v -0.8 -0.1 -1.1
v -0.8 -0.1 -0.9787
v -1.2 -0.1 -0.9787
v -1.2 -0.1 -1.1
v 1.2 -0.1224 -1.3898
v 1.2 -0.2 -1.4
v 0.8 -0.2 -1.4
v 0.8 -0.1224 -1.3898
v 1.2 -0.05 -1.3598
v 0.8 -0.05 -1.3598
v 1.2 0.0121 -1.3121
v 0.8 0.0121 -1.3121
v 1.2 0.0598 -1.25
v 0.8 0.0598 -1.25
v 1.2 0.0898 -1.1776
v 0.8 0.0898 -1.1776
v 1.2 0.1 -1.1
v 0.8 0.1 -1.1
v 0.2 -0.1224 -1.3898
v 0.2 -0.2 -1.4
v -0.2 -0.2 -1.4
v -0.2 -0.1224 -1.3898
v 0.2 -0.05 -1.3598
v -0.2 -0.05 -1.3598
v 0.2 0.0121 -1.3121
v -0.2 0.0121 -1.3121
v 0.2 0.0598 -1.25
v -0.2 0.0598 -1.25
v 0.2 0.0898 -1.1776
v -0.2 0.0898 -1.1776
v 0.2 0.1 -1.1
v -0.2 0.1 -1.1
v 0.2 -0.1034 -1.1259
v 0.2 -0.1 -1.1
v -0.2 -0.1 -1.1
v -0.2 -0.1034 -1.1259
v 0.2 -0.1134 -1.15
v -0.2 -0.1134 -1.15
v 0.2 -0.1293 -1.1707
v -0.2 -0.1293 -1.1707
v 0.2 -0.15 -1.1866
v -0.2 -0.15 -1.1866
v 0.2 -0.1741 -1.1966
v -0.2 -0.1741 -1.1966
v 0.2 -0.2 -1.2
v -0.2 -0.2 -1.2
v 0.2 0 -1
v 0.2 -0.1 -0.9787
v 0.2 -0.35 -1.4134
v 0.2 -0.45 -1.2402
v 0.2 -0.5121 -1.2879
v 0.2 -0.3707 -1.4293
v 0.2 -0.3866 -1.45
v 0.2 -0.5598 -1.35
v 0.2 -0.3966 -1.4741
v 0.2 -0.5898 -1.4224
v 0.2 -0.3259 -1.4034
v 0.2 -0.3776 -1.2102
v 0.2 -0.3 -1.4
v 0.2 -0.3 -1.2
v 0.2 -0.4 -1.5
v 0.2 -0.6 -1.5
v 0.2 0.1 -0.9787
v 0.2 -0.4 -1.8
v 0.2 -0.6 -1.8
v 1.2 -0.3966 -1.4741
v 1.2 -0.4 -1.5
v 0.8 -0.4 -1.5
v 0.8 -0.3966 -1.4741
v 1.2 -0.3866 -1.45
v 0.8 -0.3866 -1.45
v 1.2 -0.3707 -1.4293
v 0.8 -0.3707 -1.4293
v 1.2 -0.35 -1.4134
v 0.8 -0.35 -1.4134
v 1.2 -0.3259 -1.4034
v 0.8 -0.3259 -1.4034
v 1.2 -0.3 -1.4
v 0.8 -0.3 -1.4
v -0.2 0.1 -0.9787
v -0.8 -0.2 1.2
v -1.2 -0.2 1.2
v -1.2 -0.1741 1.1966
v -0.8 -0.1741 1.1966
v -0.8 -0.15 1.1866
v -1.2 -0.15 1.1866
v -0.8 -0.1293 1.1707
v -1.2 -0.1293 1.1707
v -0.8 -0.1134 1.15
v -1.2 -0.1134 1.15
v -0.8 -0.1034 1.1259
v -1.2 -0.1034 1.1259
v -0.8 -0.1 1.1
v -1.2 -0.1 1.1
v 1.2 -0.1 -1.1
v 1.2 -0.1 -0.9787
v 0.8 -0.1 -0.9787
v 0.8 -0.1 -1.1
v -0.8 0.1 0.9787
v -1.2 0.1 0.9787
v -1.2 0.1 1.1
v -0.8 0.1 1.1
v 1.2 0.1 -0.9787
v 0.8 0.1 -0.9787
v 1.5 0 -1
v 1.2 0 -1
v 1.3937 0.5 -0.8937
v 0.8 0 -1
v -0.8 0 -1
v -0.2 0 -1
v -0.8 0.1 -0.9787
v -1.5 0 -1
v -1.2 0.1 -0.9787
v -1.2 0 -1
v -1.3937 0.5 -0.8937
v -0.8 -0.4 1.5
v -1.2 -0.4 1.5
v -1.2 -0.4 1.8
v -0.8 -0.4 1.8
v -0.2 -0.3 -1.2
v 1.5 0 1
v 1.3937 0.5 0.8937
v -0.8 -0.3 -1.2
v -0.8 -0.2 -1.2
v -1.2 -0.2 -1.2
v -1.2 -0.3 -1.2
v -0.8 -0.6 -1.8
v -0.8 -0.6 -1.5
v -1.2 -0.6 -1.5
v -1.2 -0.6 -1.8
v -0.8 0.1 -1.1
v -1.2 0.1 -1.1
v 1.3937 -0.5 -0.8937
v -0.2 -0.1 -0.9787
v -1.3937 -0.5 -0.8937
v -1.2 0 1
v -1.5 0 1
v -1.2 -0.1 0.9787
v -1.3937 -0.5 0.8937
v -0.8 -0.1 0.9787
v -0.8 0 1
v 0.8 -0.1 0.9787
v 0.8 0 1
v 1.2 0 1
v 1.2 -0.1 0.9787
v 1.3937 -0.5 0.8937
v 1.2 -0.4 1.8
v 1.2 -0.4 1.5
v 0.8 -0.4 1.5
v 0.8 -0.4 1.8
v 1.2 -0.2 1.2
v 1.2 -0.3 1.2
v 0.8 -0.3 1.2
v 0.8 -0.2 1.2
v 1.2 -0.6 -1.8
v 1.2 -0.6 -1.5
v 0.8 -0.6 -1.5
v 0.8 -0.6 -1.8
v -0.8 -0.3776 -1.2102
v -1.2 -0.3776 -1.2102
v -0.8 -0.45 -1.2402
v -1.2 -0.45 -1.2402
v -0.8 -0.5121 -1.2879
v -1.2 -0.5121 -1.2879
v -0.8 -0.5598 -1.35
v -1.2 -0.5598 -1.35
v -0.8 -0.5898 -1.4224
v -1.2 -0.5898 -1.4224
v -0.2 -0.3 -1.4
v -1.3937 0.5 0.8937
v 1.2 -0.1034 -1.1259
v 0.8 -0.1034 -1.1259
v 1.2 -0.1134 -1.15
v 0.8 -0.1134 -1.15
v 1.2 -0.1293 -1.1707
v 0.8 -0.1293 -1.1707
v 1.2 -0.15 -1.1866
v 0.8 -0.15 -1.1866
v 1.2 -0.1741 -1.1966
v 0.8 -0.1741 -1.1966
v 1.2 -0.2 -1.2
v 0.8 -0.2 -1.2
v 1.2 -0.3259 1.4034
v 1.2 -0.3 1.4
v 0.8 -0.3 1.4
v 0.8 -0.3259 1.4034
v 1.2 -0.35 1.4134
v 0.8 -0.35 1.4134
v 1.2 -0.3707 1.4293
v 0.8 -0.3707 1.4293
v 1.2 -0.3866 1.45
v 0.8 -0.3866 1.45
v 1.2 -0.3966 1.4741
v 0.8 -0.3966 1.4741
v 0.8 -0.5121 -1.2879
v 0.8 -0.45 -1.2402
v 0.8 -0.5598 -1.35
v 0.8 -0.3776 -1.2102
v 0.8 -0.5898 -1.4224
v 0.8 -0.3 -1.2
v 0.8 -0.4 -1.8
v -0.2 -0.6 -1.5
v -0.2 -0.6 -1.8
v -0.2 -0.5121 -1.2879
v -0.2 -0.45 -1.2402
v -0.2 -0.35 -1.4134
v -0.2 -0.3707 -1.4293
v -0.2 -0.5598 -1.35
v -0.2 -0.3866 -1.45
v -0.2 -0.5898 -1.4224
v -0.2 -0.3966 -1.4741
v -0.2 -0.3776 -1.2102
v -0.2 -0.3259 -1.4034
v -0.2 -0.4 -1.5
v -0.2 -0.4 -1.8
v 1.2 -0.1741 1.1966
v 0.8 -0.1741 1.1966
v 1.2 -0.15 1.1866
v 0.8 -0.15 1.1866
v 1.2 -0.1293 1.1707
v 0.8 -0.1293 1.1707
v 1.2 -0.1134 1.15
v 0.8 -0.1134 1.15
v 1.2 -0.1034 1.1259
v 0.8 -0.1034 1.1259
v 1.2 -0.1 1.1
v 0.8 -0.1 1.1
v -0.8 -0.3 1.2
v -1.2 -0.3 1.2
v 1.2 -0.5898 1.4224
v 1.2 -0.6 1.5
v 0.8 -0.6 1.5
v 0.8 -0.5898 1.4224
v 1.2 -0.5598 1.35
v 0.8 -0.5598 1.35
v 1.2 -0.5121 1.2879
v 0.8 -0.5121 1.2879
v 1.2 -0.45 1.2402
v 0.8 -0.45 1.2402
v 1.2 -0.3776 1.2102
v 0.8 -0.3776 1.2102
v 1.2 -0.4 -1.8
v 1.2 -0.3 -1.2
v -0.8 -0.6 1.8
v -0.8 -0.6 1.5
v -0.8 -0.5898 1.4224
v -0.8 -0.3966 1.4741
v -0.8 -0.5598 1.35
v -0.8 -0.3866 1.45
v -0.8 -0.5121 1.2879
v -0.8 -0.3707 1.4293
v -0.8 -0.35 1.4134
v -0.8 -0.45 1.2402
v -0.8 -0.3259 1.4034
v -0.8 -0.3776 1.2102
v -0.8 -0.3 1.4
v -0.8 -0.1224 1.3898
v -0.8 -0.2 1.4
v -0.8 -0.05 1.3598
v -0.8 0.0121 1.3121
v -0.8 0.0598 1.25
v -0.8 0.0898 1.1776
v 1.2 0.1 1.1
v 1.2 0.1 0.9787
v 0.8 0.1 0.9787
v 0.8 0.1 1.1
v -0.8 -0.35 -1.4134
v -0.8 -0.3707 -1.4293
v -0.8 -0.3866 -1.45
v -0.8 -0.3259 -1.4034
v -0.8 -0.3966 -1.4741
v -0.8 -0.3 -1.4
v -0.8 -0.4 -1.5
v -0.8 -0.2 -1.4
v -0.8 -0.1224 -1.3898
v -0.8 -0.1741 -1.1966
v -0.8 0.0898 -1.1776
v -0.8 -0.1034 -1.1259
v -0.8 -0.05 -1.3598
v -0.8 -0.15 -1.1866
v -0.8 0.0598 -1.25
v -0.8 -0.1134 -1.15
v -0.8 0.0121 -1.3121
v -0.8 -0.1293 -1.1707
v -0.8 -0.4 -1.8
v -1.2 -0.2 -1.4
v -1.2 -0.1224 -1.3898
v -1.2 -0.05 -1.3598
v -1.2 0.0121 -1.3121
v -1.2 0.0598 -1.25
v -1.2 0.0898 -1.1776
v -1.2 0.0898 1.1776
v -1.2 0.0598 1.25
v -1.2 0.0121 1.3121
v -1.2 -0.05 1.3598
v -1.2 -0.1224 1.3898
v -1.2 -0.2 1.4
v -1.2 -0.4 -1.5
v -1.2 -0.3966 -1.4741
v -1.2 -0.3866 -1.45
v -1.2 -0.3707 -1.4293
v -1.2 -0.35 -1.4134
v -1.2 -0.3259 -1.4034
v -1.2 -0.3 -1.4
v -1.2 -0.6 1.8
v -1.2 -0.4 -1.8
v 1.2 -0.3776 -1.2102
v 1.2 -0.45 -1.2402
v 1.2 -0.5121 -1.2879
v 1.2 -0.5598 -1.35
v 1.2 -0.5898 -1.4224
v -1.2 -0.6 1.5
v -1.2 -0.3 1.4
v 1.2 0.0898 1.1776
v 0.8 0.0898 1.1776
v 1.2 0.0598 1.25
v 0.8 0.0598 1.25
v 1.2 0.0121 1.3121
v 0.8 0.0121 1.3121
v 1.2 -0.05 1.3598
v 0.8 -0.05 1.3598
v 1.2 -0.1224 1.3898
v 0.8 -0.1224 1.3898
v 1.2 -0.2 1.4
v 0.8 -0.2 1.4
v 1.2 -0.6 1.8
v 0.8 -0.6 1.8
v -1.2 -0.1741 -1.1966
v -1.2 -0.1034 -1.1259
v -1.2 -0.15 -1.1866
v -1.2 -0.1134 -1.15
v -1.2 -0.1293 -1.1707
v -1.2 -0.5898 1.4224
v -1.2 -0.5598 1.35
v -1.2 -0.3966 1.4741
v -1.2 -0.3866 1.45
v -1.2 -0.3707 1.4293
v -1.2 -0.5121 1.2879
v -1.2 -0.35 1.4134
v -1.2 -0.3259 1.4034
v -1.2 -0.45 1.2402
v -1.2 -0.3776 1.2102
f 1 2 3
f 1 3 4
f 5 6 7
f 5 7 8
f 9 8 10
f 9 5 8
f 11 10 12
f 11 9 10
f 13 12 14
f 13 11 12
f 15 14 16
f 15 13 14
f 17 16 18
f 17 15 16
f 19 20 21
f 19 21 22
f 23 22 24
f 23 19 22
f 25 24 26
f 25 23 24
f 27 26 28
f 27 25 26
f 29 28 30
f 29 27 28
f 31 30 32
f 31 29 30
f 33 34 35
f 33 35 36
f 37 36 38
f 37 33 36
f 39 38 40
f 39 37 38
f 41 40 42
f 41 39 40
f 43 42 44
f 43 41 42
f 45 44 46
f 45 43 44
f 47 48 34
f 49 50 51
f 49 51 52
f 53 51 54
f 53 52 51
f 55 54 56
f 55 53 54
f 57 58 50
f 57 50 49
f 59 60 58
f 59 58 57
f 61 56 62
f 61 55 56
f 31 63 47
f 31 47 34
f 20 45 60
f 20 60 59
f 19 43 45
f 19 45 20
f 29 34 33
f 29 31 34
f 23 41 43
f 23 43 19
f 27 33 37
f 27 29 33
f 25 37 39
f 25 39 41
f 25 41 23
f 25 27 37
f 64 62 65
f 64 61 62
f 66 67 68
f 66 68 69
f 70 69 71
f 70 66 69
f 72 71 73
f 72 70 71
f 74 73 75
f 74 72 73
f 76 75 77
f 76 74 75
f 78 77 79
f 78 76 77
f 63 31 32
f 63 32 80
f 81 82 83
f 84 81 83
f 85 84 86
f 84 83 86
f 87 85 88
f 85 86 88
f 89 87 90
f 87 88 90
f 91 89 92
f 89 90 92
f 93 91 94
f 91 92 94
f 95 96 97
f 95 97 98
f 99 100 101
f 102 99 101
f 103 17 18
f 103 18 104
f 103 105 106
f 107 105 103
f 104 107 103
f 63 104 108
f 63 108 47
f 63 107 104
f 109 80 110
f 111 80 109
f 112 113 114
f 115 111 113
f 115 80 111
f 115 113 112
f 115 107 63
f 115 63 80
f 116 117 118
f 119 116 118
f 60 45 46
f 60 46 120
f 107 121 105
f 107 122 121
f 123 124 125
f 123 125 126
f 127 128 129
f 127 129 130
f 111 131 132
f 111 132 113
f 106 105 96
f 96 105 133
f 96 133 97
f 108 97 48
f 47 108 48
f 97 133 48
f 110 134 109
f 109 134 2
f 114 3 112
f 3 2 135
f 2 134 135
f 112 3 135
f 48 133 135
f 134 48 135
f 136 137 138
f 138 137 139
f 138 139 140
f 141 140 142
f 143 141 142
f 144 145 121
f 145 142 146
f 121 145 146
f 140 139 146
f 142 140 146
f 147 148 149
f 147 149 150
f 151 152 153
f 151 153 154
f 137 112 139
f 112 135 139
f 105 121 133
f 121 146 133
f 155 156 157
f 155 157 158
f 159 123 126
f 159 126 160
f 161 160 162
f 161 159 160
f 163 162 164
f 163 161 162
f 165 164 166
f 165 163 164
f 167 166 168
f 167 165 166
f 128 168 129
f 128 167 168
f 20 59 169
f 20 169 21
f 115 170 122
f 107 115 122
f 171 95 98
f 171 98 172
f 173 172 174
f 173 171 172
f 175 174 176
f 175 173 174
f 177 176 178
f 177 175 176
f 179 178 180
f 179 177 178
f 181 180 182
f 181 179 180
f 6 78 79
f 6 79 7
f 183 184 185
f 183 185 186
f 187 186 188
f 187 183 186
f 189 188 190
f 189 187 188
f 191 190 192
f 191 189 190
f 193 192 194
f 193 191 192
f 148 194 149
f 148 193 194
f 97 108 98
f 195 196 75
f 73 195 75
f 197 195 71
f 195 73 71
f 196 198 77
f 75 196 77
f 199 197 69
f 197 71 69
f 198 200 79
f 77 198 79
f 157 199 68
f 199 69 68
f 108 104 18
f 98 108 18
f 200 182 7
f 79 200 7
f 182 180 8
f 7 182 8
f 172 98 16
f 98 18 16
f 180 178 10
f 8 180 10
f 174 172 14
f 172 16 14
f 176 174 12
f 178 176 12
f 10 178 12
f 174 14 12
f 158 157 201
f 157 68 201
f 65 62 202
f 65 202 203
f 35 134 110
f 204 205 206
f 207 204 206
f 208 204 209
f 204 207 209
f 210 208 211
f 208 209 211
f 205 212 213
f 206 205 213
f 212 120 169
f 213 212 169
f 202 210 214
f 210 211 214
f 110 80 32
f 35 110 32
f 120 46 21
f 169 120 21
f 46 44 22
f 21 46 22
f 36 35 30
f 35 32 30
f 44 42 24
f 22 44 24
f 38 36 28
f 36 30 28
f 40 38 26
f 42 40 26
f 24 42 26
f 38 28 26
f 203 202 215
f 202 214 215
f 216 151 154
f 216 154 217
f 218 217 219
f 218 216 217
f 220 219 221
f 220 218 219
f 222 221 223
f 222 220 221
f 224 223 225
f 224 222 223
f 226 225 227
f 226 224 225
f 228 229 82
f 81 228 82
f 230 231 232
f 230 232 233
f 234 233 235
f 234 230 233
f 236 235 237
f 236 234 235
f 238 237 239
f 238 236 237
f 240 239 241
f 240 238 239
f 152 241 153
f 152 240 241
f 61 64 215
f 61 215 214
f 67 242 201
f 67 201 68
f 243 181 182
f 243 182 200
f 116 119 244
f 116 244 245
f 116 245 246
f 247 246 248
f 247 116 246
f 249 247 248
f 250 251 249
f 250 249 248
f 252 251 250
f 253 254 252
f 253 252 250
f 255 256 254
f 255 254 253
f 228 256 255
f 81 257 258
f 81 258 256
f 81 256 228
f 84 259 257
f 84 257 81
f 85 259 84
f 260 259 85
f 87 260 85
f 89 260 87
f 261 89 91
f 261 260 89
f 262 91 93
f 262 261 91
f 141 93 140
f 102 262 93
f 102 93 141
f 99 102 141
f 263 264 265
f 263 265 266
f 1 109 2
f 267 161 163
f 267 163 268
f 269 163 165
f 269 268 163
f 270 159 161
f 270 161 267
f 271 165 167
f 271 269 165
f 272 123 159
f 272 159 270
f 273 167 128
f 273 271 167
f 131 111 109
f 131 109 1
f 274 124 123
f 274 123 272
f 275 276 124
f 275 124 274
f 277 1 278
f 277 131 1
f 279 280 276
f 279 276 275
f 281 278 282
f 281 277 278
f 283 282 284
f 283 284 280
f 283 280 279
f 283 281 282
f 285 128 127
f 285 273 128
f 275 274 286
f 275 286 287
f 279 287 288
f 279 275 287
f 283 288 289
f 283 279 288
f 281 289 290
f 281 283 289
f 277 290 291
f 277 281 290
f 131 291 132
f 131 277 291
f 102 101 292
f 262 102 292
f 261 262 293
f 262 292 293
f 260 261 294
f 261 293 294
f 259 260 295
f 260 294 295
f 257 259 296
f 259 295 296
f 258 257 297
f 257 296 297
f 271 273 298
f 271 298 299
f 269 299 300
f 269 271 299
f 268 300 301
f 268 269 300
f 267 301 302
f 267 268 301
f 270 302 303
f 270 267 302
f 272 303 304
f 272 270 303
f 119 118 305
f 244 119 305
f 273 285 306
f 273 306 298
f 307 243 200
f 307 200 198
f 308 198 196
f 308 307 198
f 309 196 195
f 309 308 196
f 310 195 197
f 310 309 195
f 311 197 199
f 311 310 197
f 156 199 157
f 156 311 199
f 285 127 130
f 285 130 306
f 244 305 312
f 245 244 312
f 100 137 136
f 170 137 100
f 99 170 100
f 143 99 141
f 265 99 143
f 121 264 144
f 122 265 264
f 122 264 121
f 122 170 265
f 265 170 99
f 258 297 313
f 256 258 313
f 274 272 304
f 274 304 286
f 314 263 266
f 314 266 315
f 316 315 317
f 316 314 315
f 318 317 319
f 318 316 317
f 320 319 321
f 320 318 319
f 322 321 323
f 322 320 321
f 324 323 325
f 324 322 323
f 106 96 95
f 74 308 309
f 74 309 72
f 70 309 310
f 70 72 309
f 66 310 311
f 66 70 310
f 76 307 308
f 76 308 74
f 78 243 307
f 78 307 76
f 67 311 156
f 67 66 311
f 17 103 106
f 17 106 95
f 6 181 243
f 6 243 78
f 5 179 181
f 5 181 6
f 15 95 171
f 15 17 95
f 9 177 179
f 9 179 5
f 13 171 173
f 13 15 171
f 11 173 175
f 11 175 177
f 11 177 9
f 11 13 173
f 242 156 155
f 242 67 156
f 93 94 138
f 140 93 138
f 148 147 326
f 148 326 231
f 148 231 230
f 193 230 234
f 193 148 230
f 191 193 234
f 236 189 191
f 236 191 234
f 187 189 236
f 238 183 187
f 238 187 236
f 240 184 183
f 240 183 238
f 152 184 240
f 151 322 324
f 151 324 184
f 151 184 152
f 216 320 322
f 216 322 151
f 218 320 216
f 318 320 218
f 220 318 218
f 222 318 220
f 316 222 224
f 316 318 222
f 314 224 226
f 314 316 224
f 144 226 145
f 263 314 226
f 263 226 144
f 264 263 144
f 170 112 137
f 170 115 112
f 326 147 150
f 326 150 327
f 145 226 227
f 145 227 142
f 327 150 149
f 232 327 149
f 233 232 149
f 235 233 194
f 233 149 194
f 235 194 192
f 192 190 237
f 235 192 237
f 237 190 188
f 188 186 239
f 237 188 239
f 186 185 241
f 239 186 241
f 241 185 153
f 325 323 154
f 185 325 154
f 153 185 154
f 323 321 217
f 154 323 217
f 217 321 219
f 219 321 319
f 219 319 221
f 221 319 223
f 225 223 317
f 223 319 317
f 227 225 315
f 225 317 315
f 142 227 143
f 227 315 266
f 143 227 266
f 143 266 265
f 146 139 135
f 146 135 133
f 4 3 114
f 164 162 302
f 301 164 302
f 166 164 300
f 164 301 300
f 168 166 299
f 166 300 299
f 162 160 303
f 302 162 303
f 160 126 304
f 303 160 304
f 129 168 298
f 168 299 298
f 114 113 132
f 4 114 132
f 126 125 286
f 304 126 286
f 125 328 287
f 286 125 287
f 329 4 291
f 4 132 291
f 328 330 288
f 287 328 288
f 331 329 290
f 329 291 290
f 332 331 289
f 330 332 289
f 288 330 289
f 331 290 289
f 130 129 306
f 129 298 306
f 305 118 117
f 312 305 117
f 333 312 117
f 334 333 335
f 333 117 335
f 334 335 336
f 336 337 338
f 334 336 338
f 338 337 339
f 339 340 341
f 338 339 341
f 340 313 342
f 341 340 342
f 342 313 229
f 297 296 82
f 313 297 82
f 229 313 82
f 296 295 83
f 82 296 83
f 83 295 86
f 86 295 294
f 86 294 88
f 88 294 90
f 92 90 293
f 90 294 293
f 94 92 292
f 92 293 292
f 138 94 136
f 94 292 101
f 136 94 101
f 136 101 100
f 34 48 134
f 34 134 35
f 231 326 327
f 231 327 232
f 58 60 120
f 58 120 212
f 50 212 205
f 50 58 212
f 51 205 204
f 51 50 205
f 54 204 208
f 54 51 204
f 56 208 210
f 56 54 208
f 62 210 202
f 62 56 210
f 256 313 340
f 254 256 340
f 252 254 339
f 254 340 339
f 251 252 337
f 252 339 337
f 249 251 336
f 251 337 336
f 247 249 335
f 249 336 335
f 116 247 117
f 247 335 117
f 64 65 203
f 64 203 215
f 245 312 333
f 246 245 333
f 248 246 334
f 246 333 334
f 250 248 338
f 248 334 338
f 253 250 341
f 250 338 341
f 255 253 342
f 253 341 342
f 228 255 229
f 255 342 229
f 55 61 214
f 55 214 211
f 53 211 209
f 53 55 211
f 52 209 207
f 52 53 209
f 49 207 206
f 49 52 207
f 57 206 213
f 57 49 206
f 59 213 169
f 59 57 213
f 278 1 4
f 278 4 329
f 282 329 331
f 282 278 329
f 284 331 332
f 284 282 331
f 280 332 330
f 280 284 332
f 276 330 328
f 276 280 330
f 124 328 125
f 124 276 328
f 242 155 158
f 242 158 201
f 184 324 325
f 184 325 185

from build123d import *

# Parameters (mm, degrees)
BASES_W               = 3
BASES_H               = 2
BASE_DEPTH            = 0.5
BASE_TAPER            = 12
BASE_OTHER_WAY_DEPTH  = 0.5
BASE_OTHER_WAY_TAPER  = 12
VINSOLDERJOINT_DEPTH  = 0.2
SJLP_COUNT            = 2
SJLP_PITCH            = 1
SJLP_COL_COUNT        = 2
SJLP_COL_PITCH        = 1
VOUTSOLDERJOINT_DEPTH = 0.2


with BuildPart() as part:
    # BaseS → Base (new body)
    with BuildSketch(Plane(origin=(0, 0, 0), x_dir=(1, 0, 0), z_dir=(0, 1, 0))):
        Rectangle(BASES_W, BASES_H)
    extrude(amount=BASE_DEPTH, taper=BASE_TAPER)

    # BaseS → Base other way (add)
    with BuildSketch(Plane(origin=(0, 0, 0), x_dir=(1, 0, 0), z_dir=(0, 1, 0))):
        Rectangle(BASES_W, BASES_H)
    extrude(amount=-BASE_OTHER_WAY_DEPTH, taper=BASE_OTHER_WAY_TAPER)

    # VInSolderJointS → VInSolderJoint (add, symmetric)
    with BuildSketch(Plane(origin=(0, 0, 0), x_dir=(0, 0, -1), z_dir=(1, 0, 0))):
        with BuildLine():
            Line((0.9, -0.1), (1.1, -0.1))
            ThreePointArc((1.1, -0.1), (1.170710678, -0.129289322), (1.2, -0.2))
            Line((1.2, -0.2), (1.2, -0.3))
            ThreePointArc((1.2, -0.3), (1.287867966, -0.512132034), (1.5, -0.6))
            Line((1.5, -0.6), (1.8, -0.6))
            Line((1.8, -0.6), (1.8, -0.4))
            Line((1.8, -0.4), (1.5, -0.4))
            ThreePointArc((1.5, -0.4), (1.429289322, -0.370710678), (1.4, -0.3))
            Line((1.4, -0.3), (1.4, -0.2))
            ThreePointArc((1.4, -0.2), (1.312132034, 0.012132034), (1.1, 0.1))
            Line((1.1, 0.1), (0.9, 0.1))
            Line((0.9, 0.1), (0.9, -0.1))
        make_face()
    vinsolderjoint = extrude(amount=VINSOLDERJOINT_DEPTH, both=True)

    # SJLP: VInSolderJoint ×2
    with Locations(*[(i * SJLP_PITCH, 0, 0) for i in range(1, SJLP_COUNT)]):
        add(vinsolderjoint)

    # SJLP col: VInSolderJoint ×2
    with Locations(*[(-i * SJLP_COL_PITCH, 0, 0) for i in range(1, SJLP_COL_COUNT)]):
        add(vinsolderjoint)

    # VOutSolderJointS → VOutSolderJoint (add, symmetric)
    with BuildSketch(Plane(origin=(1, 0, 0), x_dir=(0, 0, -1), z_dir=(1, 0, 0))):
        with BuildLine():
            Line((-0.9, 0.1), (-1.1, 0.1))
            ThreePointArc((-1.1, 0.1), (-1.312132034, 0.012132034), (-1.4, -0.2))
            Line((-1.4, -0.2), (-1.4, -0.3))
            ThreePointArc((-1.4, -0.3), (-1.429289322, -0.370710678), (-1.5, -0.4))
            Line((-1.5, -0.4), (-1.8, -0.4))
            Line((-1.8, -0.4), (-1.8, -0.6))
            Line((-1.8, -0.6), (-1.5, -0.6))
            ThreePointArc((-1.5, -0.6), (-1.287867966, -0.512132034), (-1.2, -0.3))
            Line((-1.2, -0.3), (-1.2, -0.2))
            ThreePointArc((-1.2, -0.2), (-1.170710678, -0.129289322), (-1.1, -0.1))
            Line((-1.1, -0.1), (-0.9, -0.1))
            Line((-0.9, -0.1), (-0.9, 0.1))
        make_face()
    voutsolderjoint = extrude(amount=VOUTSOLDERJOINT_DEPTH, both=True)

    # VOSJ HM: VOutSolderJoint across plane
    add(voutsolderjoint.mirror(Plane(origin=(0, 0, 0), x_dir=(0, 0, 1), z_dir=(1, 0, 0))))


solid = part.part
